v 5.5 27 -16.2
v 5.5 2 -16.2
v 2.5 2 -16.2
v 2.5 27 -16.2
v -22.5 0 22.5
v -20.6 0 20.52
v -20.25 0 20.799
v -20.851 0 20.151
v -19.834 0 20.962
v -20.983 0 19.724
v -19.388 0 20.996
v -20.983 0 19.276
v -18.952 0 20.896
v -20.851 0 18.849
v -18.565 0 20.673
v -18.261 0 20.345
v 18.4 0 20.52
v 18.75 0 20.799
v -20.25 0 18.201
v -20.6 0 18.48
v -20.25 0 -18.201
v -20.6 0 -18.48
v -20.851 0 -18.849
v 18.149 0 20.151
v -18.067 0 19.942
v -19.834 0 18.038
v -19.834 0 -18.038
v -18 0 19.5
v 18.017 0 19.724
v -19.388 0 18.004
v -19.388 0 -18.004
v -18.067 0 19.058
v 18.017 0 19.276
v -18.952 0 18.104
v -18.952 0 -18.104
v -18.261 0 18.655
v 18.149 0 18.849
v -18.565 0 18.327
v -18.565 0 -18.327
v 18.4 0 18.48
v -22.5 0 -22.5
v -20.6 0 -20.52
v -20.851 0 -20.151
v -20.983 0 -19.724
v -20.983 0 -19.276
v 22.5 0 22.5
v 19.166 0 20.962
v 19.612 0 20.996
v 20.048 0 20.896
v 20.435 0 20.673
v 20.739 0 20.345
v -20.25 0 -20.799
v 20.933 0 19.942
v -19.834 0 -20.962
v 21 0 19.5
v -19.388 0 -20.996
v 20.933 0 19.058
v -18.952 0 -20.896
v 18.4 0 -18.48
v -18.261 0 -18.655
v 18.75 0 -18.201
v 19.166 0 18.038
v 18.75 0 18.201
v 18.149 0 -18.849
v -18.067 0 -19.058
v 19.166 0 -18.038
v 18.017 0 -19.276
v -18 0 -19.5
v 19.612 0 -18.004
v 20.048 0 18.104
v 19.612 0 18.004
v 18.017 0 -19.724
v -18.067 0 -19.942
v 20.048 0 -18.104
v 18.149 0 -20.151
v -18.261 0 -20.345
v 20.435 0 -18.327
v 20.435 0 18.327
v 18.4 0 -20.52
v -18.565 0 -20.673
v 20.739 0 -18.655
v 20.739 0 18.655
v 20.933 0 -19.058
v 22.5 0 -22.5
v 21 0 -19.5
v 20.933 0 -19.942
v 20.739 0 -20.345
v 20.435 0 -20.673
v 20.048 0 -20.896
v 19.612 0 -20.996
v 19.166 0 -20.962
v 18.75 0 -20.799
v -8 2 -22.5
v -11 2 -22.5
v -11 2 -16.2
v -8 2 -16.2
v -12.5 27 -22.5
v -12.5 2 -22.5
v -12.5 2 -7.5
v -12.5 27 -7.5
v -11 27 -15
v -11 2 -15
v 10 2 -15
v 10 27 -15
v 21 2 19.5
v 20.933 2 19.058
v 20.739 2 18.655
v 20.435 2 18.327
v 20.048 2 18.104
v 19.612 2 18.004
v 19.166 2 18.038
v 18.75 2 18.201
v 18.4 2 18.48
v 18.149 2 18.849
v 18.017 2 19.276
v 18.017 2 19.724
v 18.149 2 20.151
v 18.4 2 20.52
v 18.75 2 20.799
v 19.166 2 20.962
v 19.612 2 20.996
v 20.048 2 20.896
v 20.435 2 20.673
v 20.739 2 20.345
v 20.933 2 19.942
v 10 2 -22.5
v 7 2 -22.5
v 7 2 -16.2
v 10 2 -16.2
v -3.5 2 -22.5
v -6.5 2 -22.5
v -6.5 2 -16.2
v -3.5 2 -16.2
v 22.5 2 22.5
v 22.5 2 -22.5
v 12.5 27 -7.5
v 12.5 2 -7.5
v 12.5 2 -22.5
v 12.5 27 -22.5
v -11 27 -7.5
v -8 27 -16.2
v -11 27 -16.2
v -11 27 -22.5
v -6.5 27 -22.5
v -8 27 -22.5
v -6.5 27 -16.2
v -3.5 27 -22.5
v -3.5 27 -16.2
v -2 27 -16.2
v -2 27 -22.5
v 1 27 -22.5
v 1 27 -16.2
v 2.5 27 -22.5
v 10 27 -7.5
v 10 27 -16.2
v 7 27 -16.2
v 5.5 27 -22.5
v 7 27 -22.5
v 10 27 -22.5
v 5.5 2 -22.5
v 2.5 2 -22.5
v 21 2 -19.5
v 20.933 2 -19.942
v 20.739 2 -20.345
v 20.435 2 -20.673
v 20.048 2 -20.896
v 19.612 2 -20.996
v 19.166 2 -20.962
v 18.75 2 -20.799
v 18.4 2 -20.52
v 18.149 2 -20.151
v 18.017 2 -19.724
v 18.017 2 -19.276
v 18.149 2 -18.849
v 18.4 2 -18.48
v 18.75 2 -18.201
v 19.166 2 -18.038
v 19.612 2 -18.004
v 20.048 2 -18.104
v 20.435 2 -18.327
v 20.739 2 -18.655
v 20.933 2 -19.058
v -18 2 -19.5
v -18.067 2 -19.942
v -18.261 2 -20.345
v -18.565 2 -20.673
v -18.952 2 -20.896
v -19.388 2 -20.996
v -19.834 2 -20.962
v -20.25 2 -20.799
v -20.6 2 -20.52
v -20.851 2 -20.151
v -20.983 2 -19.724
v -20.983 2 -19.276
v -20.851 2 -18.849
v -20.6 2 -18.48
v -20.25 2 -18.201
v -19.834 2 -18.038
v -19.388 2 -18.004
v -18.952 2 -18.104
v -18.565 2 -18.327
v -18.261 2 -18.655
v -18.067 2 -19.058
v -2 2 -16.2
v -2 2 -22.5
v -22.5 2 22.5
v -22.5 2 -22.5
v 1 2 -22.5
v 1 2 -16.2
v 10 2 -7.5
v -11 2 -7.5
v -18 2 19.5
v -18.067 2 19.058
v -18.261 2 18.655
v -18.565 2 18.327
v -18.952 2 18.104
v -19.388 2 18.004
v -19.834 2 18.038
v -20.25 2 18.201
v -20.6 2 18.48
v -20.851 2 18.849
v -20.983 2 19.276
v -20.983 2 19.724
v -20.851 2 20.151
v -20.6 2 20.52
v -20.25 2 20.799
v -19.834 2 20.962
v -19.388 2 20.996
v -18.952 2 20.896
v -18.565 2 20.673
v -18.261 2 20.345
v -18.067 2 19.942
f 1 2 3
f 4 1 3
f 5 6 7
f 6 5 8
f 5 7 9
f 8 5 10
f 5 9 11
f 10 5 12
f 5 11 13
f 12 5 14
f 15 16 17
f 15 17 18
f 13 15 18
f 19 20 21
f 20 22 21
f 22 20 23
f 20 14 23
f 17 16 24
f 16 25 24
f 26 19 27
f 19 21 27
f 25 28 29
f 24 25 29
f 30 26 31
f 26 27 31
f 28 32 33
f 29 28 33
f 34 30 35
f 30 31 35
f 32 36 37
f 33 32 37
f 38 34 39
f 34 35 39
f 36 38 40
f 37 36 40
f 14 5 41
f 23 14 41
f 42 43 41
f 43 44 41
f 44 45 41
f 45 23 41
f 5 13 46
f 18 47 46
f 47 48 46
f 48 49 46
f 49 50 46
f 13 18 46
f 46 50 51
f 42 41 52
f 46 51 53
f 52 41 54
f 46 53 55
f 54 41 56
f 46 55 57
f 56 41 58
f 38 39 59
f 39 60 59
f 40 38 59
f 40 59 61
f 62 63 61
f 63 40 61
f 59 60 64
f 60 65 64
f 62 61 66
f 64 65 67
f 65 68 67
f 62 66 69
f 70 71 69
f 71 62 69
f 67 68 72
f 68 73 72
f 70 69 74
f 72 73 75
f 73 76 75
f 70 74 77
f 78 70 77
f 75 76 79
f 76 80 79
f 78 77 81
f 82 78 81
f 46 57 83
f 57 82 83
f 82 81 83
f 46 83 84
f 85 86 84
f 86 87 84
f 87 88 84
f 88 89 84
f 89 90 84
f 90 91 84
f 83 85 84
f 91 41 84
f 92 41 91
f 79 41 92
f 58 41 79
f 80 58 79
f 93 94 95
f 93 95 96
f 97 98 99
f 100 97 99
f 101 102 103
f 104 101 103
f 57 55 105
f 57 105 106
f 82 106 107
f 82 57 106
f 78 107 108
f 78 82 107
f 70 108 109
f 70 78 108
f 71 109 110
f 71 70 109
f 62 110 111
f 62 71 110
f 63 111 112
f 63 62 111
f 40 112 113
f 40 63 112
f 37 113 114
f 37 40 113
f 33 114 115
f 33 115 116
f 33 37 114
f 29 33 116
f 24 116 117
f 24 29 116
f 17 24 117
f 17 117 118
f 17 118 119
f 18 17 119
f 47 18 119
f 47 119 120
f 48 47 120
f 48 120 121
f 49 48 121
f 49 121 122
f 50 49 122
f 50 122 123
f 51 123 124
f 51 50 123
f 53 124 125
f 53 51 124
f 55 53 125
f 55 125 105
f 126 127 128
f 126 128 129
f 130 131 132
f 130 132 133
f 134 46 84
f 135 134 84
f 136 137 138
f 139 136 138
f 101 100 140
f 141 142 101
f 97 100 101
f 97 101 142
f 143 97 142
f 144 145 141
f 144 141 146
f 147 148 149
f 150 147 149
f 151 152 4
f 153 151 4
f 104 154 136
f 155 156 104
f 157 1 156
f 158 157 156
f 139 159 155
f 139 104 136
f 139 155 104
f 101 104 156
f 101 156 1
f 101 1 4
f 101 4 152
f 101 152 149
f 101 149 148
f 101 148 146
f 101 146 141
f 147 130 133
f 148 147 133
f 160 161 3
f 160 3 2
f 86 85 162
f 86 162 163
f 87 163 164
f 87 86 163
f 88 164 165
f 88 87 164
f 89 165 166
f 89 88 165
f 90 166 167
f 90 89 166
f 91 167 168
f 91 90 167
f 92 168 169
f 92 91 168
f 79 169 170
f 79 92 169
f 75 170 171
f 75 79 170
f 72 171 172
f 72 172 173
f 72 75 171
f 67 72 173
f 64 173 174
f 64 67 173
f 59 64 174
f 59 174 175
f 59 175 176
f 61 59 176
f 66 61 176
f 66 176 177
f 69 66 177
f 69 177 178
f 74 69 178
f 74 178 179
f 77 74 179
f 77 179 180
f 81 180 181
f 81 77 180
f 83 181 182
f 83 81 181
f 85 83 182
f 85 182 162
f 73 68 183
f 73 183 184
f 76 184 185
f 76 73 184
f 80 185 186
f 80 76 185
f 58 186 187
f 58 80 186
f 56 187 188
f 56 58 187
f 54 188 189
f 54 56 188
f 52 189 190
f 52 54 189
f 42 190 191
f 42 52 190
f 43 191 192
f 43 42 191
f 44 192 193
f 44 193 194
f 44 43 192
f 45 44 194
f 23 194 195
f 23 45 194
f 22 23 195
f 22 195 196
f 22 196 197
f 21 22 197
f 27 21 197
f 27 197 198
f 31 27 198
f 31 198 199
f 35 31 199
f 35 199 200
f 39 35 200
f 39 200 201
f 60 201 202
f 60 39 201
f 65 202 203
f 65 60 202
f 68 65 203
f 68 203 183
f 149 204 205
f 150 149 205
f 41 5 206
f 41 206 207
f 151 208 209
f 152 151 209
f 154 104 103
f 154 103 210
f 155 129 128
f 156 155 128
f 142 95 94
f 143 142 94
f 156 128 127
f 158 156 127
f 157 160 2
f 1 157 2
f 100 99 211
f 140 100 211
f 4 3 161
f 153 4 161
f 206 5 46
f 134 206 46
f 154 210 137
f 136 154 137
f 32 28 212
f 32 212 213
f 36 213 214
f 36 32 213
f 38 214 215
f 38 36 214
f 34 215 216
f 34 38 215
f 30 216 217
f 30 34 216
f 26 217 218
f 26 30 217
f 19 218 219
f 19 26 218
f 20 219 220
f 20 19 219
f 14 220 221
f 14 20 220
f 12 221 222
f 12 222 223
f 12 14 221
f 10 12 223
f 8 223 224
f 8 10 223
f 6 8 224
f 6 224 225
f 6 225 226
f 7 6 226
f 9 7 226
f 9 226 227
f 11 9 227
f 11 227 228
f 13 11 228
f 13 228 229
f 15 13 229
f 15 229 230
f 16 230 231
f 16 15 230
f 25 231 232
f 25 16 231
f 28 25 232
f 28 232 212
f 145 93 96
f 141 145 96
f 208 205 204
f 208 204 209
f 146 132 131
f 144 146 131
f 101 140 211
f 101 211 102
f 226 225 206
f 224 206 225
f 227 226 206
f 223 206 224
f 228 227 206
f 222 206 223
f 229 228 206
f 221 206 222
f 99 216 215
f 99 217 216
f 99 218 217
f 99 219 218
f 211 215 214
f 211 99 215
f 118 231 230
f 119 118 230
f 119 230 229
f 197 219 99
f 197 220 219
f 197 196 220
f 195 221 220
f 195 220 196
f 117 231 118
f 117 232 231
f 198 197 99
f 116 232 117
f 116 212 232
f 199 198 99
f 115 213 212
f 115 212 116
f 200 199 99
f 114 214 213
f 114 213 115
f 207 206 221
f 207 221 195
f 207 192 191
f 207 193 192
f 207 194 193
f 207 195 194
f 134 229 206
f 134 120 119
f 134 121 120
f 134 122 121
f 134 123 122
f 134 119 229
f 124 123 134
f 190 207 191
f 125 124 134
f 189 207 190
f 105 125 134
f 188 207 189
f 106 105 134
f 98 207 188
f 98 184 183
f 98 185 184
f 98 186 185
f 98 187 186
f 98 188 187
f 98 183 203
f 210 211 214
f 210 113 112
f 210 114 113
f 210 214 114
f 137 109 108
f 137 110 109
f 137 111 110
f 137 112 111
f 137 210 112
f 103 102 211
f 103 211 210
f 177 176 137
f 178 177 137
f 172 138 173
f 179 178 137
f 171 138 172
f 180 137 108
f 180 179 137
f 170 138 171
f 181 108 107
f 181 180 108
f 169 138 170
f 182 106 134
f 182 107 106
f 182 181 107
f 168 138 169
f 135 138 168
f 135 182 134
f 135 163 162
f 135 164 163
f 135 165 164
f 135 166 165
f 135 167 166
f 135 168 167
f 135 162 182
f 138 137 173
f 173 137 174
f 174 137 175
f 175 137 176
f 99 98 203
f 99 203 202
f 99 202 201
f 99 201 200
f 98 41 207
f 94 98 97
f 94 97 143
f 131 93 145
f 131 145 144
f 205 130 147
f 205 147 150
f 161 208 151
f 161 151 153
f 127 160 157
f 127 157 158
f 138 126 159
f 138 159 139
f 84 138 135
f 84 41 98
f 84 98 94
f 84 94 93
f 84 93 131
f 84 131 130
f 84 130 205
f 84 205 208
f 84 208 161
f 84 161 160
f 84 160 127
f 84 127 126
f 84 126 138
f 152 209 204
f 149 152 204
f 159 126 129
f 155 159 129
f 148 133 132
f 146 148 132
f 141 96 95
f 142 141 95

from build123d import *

# Parameters (mm, degrees)
SKETCH1_W           = 45
SKETCH1_H           = 45
SKETCH1_R           = 1.5
BOSS_EXTRUDE1_DEPTH = 2
BOSS_EXTRUDE2_DEPTH = 25


with BuildPart() as part:
    # Sketch1 → Boss-Extrude1 (new body)
    with BuildSketch(Plane(origin=(0, 0, 0), x_dir=(1, 0, 0), z_dir=(0, 1, 0))):
        Rectangle(SKETCH1_W, SKETCH1_H)
        with Locations((-19.5, 19.5)):
            Circle(SKETCH1_R, mode=Mode.SUBTRACT)
        with Locations((19.5, 19.5)):
            Circle(SKETCH1_R, mode=Mode.SUBTRACT)
        with Locations((-19.5, -19.5)):
            Circle(SKETCH1_R, mode=Mode.SUBTRACT)
        with Locations((19.5, -19.5)):
            Circle(SKETCH1_R, mode=Mode.SUBTRACT)
    extrude(amount=BOSS_EXTRUDE1_DEPTH)

    # Sketch2 → Boss-Extrude2 (add)
    with BuildSketch(Plane(origin=(0, 2, 0), x_dir=(1, 0, 0), z_dir=(0, 1, 0))):
        Polygon((10, 7.5), (12.5, 7.5), (12.5, 22.5), (10, 22.5), (10, 16.2), (7, 16.2), (7, 22.5), (5.5, 22.5), (5.5, 16.2), (2.5, 16.2), (2.5, 22.5), (1, 22.5), (1, 16.2), (-2, 16.2), (-2, 22.5), (-3.5, 22.5), (-3.5, 16.2), (-6.5, 16.2), (-6.5, 22.5), (-8, 22.5), (-8, 16.2), (-11, 16.2), (-11, 22.5), (-12.5, 22.5), (-12.5, 7.5), (-11, 7.5), (-11, 15), (10, 15), align=None)
    extrude(amount=BOSS_EXTRUDE2_DEPTH)


solid = part.part
